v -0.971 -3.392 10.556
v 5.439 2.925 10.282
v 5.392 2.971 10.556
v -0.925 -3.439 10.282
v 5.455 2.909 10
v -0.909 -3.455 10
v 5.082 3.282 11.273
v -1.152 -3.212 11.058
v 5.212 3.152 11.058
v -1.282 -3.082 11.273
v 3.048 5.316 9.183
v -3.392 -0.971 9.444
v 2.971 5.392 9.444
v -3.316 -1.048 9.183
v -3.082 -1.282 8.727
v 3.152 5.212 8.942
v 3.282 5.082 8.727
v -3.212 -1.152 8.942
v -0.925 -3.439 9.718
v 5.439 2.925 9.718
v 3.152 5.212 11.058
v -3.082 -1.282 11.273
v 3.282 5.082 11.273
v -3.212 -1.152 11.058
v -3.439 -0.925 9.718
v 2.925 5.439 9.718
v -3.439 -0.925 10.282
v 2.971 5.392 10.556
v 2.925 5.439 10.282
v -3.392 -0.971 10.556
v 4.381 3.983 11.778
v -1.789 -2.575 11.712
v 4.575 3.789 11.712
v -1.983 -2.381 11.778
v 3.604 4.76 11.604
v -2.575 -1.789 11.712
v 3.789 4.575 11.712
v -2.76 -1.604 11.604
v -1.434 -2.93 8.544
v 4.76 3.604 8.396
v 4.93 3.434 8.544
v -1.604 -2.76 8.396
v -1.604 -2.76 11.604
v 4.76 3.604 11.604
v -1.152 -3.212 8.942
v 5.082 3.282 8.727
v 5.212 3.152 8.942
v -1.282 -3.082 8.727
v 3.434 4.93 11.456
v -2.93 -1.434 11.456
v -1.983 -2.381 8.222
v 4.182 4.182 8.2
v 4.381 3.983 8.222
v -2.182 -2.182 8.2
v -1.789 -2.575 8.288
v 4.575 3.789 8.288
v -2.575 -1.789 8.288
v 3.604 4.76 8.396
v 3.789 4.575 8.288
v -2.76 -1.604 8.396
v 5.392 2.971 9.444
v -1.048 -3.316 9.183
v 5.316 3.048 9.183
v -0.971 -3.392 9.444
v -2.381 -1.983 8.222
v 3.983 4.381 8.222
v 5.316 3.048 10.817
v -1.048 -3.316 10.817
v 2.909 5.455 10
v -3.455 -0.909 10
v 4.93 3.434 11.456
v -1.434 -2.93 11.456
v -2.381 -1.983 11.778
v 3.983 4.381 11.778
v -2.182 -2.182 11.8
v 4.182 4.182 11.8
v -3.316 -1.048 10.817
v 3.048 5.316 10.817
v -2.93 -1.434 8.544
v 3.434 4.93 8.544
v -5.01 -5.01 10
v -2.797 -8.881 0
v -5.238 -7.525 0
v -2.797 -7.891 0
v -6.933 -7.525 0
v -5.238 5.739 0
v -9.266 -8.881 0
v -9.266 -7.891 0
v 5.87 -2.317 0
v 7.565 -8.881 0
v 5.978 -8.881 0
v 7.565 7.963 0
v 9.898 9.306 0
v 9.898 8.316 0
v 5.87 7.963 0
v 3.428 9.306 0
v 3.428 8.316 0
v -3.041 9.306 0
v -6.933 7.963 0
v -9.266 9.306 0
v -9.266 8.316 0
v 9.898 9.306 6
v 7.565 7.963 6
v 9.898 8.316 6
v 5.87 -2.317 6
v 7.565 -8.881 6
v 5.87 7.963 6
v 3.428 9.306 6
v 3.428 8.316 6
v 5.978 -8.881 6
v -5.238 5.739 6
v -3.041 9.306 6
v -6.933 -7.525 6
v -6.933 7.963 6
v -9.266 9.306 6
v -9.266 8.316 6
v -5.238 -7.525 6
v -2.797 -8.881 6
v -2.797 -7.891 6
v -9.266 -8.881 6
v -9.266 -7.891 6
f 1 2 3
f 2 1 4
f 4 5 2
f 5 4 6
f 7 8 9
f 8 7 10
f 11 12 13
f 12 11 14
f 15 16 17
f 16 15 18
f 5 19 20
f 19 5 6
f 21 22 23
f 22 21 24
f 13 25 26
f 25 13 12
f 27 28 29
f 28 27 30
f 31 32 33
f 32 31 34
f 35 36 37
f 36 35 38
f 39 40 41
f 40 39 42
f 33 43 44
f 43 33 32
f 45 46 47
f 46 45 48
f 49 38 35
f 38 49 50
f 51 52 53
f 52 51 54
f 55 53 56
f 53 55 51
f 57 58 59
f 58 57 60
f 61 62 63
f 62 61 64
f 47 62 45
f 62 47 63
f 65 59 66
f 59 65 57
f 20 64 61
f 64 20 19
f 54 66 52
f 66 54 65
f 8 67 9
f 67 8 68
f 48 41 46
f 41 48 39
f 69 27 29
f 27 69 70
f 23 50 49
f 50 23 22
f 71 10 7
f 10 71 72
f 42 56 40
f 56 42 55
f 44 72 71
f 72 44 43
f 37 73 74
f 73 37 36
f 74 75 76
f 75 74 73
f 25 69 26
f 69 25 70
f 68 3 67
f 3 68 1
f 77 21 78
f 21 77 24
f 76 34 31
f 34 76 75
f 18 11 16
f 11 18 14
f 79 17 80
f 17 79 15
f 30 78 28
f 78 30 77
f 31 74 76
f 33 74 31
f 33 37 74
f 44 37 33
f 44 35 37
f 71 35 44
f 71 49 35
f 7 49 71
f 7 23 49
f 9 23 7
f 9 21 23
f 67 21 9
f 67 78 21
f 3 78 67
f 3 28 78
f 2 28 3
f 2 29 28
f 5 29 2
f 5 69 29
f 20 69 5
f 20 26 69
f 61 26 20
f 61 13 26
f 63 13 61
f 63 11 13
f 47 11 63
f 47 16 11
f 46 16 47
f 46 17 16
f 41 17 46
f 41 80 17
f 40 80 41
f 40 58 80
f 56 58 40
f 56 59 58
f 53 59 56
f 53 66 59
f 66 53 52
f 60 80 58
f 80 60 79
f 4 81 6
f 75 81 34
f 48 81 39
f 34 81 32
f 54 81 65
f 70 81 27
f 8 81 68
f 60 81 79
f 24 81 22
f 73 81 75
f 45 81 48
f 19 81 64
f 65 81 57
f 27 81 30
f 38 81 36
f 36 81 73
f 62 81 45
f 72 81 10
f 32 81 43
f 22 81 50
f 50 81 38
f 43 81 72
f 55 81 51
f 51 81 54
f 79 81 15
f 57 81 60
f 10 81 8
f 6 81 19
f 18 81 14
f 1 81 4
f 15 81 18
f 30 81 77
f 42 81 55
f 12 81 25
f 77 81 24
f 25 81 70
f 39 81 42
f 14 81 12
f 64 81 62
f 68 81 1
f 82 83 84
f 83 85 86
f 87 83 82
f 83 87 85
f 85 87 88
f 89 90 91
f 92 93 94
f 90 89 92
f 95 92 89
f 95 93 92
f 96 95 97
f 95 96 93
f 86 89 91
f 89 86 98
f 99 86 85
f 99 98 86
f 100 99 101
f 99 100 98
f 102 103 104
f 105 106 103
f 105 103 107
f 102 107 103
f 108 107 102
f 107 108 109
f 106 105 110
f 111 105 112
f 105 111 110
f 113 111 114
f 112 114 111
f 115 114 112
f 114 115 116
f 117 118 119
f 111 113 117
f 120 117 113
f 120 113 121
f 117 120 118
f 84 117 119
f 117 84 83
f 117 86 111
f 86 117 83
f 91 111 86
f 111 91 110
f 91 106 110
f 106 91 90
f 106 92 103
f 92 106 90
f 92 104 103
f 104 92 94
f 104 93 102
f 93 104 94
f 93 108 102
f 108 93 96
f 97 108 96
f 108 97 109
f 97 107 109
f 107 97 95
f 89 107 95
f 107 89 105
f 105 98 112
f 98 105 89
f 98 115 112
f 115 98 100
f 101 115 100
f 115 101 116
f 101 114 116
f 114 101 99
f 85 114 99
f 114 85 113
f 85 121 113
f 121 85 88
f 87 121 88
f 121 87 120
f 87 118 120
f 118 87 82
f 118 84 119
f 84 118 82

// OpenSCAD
// file: Pencil.scad
//=============================================================================
// Pencil added to an icon to show it is used for editing.
// =============================================================================

module Pencil() {
  rotate([90, 0, -45]) union() {
    radius    = 1.8;
    cylHeight = 9;
    coneHeight = 4;
    cylinder(r = radius, h = cylHeight, center = true);
    translate([0, 0, (cylHeight + coneHeight) / 2])
      cylinder(r1 = radius, r2 = 0, h = coneHeight, center = true);
  }
}

$fn = 40;
Pencil();
// main file
use <Pencil.scad>

module NameToolIcon() {
  linear_extrude(height = 6) {
    text(text = "N", font="Liberation Serif:style=Bold",
         size = 20, halign = "center", valign = "center");
  }
  translate([1, 1, 10]) Pencil();
}

NameToolIcon();
